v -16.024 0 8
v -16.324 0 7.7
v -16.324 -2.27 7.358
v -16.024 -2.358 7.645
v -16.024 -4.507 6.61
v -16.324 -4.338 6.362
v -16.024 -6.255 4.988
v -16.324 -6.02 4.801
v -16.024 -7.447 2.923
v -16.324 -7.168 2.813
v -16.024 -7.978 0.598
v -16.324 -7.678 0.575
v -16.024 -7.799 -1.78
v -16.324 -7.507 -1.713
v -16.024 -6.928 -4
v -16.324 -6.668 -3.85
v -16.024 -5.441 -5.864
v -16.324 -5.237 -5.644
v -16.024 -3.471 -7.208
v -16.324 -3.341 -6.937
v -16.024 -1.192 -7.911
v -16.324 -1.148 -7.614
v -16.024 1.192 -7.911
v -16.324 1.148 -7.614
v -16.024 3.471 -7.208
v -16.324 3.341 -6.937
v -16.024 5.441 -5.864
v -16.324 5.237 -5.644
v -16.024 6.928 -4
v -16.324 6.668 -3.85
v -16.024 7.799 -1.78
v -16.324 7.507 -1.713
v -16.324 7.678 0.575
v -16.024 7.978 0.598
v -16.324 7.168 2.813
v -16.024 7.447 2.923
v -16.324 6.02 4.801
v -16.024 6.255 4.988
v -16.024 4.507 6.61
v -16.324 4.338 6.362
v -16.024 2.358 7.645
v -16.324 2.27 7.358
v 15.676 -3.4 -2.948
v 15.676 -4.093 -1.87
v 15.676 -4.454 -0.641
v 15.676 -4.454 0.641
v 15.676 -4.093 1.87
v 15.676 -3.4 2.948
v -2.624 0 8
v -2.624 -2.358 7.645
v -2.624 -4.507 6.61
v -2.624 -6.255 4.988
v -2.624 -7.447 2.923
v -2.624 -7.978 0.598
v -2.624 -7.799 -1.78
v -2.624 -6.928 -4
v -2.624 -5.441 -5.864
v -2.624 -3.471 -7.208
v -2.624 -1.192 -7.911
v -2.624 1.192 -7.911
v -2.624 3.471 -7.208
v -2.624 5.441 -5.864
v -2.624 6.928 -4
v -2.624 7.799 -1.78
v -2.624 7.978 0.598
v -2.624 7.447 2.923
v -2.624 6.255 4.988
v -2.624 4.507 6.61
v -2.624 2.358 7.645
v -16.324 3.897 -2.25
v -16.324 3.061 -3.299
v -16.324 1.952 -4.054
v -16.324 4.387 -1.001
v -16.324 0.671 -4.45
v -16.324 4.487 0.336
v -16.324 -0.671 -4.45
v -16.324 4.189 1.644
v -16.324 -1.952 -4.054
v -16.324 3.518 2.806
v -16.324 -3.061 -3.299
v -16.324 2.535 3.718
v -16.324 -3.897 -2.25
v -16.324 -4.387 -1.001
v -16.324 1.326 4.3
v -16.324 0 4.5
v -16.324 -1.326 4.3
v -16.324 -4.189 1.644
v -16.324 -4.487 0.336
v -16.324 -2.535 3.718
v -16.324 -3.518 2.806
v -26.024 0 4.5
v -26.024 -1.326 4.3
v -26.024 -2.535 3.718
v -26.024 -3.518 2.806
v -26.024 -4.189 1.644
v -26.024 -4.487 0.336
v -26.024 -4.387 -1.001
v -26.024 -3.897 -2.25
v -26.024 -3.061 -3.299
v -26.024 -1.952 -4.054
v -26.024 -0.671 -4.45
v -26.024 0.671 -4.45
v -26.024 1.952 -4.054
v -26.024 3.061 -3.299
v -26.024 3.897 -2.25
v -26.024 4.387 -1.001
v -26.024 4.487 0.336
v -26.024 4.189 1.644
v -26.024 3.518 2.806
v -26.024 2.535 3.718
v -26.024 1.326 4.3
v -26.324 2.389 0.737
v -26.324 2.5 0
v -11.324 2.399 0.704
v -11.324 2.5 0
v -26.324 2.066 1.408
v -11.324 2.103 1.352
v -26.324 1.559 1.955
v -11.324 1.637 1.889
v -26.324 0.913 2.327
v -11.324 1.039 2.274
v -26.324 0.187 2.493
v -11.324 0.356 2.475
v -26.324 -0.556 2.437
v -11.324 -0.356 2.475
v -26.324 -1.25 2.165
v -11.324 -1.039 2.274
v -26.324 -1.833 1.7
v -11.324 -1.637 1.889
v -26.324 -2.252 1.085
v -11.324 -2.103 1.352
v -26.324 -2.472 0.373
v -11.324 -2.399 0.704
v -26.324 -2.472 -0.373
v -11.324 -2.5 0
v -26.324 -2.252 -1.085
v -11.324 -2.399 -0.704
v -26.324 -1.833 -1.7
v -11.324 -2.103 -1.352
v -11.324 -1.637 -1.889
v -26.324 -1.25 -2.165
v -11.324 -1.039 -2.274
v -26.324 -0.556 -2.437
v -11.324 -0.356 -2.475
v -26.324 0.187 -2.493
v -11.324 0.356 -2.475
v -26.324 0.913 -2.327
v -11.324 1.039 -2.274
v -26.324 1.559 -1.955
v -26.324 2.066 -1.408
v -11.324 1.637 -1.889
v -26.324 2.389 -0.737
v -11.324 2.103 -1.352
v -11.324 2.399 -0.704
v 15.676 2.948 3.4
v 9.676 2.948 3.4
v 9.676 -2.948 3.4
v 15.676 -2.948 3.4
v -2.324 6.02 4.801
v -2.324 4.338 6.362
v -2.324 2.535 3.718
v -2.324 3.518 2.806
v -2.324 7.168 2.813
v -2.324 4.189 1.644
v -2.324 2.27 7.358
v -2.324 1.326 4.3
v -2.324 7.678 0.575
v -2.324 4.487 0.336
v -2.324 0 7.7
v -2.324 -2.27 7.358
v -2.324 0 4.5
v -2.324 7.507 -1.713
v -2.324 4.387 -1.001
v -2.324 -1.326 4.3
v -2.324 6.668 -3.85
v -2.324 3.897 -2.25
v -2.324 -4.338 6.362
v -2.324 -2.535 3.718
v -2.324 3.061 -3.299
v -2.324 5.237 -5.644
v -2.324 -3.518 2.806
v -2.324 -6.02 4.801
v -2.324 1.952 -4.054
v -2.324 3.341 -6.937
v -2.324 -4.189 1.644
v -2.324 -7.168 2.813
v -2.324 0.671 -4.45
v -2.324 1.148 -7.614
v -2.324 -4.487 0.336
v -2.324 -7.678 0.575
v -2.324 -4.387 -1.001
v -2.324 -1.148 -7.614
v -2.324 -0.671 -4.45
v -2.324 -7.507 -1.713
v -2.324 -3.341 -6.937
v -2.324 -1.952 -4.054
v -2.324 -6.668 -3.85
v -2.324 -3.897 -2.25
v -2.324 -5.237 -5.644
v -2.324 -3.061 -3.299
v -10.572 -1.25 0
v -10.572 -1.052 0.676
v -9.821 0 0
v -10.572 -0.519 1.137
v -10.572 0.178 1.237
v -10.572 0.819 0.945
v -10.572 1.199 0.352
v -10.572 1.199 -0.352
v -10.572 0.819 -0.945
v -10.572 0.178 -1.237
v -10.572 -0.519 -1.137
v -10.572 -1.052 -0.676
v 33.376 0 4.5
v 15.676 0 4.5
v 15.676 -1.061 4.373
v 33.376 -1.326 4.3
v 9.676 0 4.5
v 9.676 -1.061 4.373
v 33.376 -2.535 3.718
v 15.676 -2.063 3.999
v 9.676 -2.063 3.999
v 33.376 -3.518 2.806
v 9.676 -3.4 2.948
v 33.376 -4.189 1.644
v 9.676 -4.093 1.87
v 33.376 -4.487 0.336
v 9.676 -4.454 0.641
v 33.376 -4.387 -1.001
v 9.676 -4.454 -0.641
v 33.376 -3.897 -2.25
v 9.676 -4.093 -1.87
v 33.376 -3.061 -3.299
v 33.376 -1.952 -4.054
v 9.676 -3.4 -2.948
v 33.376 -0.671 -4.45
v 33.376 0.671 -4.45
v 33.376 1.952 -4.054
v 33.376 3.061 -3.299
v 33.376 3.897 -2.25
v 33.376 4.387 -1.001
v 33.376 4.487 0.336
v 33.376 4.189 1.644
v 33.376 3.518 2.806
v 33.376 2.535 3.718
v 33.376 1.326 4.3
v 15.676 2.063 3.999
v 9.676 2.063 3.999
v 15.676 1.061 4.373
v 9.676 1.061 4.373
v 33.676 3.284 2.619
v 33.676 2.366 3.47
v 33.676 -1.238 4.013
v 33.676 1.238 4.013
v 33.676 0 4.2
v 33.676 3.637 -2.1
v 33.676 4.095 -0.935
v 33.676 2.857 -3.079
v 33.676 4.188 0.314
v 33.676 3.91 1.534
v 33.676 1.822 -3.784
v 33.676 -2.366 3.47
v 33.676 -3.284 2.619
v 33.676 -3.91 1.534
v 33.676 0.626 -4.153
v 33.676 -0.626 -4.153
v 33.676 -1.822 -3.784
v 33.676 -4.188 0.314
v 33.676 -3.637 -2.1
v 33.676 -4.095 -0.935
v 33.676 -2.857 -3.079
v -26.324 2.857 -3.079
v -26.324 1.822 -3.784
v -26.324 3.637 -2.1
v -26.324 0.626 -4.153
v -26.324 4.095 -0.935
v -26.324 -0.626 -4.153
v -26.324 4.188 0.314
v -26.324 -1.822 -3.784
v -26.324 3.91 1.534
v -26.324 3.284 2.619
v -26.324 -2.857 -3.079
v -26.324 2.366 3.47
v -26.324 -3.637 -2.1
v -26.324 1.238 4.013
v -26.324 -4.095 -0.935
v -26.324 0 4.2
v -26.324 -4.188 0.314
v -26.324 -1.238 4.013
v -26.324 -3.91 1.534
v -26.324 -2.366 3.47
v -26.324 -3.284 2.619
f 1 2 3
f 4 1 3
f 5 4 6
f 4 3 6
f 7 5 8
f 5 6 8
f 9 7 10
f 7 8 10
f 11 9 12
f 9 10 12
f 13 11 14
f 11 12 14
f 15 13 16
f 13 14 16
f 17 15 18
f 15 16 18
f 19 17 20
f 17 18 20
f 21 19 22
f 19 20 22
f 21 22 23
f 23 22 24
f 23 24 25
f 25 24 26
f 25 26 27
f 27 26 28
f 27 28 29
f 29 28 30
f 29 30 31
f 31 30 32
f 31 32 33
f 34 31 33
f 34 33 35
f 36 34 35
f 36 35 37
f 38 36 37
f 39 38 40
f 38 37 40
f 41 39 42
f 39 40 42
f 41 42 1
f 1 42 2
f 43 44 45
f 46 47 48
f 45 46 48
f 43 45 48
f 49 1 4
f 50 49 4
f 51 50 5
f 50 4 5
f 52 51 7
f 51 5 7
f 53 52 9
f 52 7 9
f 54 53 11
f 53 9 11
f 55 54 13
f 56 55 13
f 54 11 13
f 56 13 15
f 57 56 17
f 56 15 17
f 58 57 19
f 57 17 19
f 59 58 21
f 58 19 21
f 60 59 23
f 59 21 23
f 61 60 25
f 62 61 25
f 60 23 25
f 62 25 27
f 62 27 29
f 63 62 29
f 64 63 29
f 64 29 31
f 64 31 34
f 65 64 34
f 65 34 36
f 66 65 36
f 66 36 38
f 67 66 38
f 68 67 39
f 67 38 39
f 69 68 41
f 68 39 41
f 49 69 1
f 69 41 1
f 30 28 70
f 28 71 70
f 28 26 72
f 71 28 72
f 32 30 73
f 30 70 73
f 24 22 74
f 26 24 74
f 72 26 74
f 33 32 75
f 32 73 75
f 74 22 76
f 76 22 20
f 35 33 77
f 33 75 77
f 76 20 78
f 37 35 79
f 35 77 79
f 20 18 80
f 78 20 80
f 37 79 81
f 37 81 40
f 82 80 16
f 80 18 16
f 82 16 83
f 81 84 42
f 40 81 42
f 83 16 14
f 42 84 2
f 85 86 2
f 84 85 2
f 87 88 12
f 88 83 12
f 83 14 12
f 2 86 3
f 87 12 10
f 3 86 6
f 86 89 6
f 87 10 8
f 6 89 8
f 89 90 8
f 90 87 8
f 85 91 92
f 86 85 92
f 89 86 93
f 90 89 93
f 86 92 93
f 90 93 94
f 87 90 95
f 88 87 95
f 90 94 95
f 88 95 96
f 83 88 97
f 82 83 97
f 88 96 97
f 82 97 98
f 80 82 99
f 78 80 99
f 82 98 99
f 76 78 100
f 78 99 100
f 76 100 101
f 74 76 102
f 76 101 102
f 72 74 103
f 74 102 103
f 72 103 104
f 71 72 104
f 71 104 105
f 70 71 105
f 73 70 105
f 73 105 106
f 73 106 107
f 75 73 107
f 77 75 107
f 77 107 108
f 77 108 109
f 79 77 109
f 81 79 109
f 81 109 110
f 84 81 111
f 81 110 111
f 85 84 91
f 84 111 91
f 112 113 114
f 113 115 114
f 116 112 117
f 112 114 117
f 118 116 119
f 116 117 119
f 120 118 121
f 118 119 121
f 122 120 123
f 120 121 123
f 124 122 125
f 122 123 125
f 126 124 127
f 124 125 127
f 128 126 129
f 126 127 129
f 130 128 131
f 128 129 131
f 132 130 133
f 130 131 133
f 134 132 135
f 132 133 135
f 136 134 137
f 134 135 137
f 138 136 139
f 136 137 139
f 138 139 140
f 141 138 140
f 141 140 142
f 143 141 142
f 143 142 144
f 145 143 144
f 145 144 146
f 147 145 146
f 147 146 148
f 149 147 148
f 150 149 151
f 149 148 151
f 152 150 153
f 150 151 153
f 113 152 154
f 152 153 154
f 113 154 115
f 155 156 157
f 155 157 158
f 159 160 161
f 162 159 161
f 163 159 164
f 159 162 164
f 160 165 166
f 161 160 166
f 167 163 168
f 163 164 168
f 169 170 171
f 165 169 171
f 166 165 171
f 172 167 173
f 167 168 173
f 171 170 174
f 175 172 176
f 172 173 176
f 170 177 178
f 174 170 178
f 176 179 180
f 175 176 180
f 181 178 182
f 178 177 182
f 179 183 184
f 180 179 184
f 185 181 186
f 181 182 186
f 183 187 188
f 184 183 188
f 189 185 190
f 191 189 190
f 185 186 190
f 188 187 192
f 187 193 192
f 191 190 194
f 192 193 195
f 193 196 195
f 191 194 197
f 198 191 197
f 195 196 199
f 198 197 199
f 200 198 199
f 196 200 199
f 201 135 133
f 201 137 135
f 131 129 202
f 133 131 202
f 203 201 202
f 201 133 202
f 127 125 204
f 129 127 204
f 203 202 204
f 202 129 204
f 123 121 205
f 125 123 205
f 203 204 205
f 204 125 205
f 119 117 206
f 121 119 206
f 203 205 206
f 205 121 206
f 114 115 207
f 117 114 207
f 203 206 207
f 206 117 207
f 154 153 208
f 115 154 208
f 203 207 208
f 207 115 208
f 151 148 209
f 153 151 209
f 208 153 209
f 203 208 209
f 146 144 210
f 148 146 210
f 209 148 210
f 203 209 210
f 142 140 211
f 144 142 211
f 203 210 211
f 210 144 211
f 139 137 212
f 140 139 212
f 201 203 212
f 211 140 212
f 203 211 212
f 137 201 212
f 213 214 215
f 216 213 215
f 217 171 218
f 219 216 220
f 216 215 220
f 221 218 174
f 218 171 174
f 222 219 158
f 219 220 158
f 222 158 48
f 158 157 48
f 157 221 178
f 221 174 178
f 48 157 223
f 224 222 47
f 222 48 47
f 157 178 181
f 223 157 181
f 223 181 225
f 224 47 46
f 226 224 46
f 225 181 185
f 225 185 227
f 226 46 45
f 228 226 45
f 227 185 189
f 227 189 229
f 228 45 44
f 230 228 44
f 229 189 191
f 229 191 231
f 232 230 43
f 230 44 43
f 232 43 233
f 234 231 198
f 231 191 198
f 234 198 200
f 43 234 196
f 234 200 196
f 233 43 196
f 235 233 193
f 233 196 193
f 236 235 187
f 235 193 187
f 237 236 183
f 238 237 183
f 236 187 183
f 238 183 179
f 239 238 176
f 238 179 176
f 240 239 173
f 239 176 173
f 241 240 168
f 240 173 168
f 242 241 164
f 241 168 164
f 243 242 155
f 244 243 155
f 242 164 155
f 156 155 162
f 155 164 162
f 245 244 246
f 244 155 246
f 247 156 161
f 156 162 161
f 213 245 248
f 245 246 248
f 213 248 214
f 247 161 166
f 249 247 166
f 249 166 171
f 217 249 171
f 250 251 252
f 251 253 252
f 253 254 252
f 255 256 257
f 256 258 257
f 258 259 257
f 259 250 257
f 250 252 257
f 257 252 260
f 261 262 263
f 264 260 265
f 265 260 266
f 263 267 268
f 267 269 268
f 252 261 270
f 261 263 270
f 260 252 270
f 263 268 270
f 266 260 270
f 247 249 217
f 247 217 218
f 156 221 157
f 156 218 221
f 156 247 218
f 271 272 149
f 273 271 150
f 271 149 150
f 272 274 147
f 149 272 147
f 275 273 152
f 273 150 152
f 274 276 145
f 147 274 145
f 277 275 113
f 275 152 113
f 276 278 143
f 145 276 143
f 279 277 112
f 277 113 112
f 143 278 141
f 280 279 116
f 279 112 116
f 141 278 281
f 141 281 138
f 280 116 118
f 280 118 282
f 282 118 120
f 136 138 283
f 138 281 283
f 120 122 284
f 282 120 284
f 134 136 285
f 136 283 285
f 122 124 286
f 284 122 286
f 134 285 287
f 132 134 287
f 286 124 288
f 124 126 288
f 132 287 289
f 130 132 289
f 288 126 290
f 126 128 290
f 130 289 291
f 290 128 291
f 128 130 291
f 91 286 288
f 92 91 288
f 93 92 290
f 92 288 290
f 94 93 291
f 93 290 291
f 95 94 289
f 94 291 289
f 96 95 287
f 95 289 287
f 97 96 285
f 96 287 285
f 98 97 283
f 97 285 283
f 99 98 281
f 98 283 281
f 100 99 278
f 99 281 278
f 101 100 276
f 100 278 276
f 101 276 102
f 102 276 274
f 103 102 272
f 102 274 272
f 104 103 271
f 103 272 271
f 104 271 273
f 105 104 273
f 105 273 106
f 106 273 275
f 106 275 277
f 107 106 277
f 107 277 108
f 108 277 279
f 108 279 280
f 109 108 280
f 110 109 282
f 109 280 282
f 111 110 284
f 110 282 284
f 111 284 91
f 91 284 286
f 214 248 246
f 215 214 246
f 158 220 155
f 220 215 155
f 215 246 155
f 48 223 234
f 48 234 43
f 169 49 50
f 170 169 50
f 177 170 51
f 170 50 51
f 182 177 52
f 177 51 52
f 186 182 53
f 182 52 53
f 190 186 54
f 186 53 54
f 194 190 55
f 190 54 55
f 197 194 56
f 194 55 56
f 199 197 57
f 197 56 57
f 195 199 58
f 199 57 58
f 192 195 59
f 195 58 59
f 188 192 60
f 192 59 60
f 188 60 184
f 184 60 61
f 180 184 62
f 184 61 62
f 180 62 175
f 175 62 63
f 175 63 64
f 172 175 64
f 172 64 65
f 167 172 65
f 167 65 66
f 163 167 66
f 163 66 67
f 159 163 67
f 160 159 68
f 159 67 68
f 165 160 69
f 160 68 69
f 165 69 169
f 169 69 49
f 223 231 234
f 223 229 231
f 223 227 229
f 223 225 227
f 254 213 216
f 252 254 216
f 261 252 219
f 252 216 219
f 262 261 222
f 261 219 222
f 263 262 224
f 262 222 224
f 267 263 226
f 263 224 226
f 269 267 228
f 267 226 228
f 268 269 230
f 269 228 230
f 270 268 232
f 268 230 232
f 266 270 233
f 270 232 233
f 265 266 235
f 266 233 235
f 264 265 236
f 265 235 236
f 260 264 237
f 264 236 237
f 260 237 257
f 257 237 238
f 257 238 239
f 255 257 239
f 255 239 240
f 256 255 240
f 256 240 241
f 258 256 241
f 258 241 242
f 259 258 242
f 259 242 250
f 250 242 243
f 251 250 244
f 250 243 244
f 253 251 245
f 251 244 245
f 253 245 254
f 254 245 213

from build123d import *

# Parameters (mm, degrees)
F2_SIZE   = 0.3
F3_SIZE   = 0.3
F4_SIZE   = 0.3
F7_W      = 6
F7_H      = 6
F8_DEPTH  = 1.1
F10_W     = 6
F10_H     = 6
F11_DEPTH = 1.1
F13_D     = 5
F13_DEPTH = 15
F13_TIP   = 1.5021515476


with BuildPart() as f1:
    # F0 (on Front) → F1 (revolve)
    with BuildSketch(Plane.XZ):
        Polygon((-26.3235288649, 4.5), (-26.3235288649, 0), (33.6764711351, 0), (33.6764711351, 4.5), (-2.3235288649, 4.5), (-2.3235288649, 8), (-16.3235288649, 8), (-16.3235288649, 4.5), align=None)
    revolve(axis=Axis((3.6764711351, 0, 0), (1, 0, 0)))

    # F2
    f2_edges = [f1.edges().sort_by_distance(p)[0] for p in [
        (33.676471, 0, -4.5),
    ]]
    chamfer(f2_edges, length=F2_SIZE)

    # F3
    f3_edges = [f1.edges().sort_by_distance(p)[0] for p in [
        (-2.323529, 0, -8),
        (-16.323529, 0, -8),
        (-9.323529, 0, 8),
    ]]
    chamfer(f3_edges, length=F3_SIZE)

    # F4
    f4_edges = [f1.edges().sort_by_distance(p)[0] for p in [
        (-26.323529, 0, -4.5),
    ]]
    chamfer(f4_edges, length=F4_SIZE)

    # F7 (on offset) → F8 (cut)
    with BuildSketch(Plane.XZ.offset(4.5)):
        with Locations((12.6764711351, 0)):
            Rectangle(F7_W, F7_H)
    extrude(amount=-F8_DEPTH, mode=Mode.SUBTRACT)

    # F10 (on offset) → F11 (cut)
    with BuildSketch(Plane.XY.offset(4.5)):
        with Locations((12.6764711351, 0)):
            Rectangle(F10_W, F10_H)
    extrude(amount=-F11_DEPTH, mode=Mode.SUBTRACT)

    # F13
    with Locations(Plane(origin=(-26.3235288649, 0, 0), x_dir=(0, -1, 0), z_dir=(-1, 0, 0))):
        with Locations((0, 0)):
            Hole(F13_D / 2, depth=F13_DEPTH)
            with Locations((0, 0, -(F13_DEPTH + F13_TIP / 2))):  # 118° drill point
                Cone(0, F13_D / 2, F13_TIP, mode=Mode.SUBTRACT)


solid = f1.part
